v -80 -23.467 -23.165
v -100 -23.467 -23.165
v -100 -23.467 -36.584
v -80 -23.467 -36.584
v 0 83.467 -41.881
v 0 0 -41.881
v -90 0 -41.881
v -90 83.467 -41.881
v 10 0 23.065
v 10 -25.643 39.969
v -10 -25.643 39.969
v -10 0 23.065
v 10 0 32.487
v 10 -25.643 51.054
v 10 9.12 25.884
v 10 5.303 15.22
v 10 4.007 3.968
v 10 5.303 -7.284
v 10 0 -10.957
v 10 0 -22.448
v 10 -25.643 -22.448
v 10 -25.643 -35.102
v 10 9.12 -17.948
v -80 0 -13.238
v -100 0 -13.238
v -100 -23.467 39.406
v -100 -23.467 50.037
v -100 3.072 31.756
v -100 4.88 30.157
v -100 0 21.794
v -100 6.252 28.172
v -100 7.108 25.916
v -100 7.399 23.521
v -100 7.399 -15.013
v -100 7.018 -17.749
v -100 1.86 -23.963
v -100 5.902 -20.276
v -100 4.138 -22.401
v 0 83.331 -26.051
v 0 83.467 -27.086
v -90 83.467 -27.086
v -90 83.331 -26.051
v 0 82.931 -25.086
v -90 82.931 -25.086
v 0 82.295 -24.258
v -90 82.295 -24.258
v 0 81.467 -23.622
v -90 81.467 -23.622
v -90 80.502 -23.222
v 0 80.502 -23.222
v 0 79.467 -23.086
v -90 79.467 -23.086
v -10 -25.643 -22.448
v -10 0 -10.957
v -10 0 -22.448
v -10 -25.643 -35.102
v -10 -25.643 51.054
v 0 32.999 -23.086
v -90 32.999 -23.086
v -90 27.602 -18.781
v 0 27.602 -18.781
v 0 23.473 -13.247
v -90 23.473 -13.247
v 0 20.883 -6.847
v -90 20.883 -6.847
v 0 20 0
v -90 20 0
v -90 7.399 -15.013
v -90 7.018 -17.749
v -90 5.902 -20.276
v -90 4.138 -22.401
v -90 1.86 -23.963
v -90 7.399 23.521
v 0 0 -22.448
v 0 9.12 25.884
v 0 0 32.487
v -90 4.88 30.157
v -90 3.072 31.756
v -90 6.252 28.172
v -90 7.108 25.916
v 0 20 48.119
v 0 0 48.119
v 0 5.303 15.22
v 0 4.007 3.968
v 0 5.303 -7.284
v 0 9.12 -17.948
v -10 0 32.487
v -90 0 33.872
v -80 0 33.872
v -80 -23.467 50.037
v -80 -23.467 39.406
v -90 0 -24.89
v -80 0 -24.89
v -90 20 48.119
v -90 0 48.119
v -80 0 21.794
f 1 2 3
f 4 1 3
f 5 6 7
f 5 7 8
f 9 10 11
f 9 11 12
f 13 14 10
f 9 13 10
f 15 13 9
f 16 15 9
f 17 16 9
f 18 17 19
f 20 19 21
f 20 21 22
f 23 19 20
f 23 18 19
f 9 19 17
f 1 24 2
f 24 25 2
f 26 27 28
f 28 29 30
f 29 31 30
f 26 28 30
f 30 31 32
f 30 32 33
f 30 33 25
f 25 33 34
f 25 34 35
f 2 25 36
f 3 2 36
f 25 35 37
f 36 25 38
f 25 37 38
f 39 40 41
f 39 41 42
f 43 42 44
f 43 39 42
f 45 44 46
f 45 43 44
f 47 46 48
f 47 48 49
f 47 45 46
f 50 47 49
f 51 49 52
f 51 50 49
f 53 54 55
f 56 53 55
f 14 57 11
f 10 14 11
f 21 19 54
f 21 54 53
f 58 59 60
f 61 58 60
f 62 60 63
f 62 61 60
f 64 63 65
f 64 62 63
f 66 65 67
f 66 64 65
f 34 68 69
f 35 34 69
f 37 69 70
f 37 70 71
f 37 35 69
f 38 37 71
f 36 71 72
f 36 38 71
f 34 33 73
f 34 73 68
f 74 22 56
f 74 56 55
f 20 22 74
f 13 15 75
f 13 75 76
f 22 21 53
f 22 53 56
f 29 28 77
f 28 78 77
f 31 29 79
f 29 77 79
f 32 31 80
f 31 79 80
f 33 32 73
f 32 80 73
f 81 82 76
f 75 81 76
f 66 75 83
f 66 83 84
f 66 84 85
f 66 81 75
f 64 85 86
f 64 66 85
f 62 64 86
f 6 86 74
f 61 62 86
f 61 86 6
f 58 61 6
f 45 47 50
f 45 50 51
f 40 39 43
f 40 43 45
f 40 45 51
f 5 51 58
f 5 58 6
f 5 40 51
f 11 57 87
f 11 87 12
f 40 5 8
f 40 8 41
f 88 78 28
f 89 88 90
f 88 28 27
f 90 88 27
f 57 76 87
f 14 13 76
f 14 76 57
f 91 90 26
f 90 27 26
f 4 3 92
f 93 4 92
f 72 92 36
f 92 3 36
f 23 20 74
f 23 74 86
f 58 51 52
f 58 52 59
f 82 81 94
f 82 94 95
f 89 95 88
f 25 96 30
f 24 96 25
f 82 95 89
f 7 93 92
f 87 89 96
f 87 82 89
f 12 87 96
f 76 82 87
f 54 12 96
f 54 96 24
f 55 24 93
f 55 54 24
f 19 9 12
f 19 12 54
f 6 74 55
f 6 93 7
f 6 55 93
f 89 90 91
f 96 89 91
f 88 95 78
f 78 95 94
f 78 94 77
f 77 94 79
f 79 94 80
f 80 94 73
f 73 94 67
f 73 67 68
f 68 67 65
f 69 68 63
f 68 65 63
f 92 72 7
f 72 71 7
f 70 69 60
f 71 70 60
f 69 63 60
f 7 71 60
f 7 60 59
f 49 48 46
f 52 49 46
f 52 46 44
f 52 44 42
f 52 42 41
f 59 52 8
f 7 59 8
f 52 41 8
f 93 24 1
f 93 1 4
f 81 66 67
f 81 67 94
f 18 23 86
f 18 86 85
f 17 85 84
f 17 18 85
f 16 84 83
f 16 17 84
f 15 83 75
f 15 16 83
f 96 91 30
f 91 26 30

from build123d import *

# Parameters (mm, degrees)
BOSS_EXTRUDE2_DEPTH = 90
BOSS_EXTRUDE4_DEPTH = 10
BOSS_EXTRUDE5_DEPTH = 10
FILLET1_R           = 10


with BuildPart() as part:
    # Sketch1 → Boss-Extrude2 (new body)
    with BuildSketch(Plane(origin=(0, 0, 0), x_dir=(0, 0, -1), z_dir=(1, 0, 0))):
        with BuildLine():
            Line((-48.118811881, 0), (41.881188119, 0))
            Line((41.881188119, 0), (41.881188119, 83.466961913))
            Line((41.881188119, 83.466961913), (27.086166787, 83.466961913))
            ThreePointArc((27.086166787, 83.466961913), (24.257739663, 82.295389038), (23.086166787, 79.466961913))
            Line((23.086166787, 79.466961913), (23.086166787, 32.998967786))
            ThreePointArc((23.086166787, 32.998967786), (13.24711535, 23.473123138), (0, 20))
            Line((0, 20), (-48.118811881, 20))
            Line((-48.118811881, 20), (-48.118811881, 0))
        make_face()
    extrude(amount=-BOSS_EXTRUDE2_DEPTH)

    # Sketch2 → Boss-Extrude4 (add, symmetric)
    with BuildSketch(Plane(origin=(0, 0, 0), x_dir=(0, 0, -1), z_dir=(1, 0, 0))):
        with BuildLine():
            Line((-32.487137017, 0), (-51.053894903, -25.643291777))
            Line((-51.053894903, -25.643291777), (-39.969263329, -25.643291777))
            Line((-39.969263329, -25.643291777), (-23.065200179, 0))
            Line((-23.065200179, 0), (10.956889222, 0))
            Line((10.956889222, 0), (22.448464713, -25.643291777))
            Line((22.448464713, -25.643291777), (35.102344658, -25.643291777))
            Line((35.102344658, -25.643291777), (22.448464713, 0))
            Line((22.448464713, 0), (17.947936645, 9.120392711))
            ThreePointArc((17.947936645, 9.120392711), (-3.967837589, 4.007448958), (-25.883611823, 9.120392711))
            Line((-25.883611823, 9.120392711), (-32.487137017, 0))
        make_face()
    extrude(amount=BOSS_EXTRUDE4_DEPTH, both=True)

    # Sketch5 → Boss-Extrude5 (add, symmetric)
    with BuildSketch(Plane.ZY.offset(90)):
        Polygon((-15.060305743, 7.399353966), (28.775027298, 7.399353966), (50.037353524, -23.467201706), (39.406190411, -23.467201706), (21.793994687, 0), (-13.237941151, 0), (-23.164531139, -23.467201706), (-36.584121335, -23.467201706), (-21.202482156, 7.399353966), align=None)
    extrude(amount=BOSS_EXTRUDE5_DEPTH, both=True)

    # Fillet1
    fillet1_edges = [part.edges().sort_by_distance(p)[0] for p in [
        (-95, 7.399353966, 28.775027298),
        (-95, 7.399353966, -21.202482156),
    ]]
    fillet(fillet1_edges, radius=FILLET1_R)


solid = part.part
